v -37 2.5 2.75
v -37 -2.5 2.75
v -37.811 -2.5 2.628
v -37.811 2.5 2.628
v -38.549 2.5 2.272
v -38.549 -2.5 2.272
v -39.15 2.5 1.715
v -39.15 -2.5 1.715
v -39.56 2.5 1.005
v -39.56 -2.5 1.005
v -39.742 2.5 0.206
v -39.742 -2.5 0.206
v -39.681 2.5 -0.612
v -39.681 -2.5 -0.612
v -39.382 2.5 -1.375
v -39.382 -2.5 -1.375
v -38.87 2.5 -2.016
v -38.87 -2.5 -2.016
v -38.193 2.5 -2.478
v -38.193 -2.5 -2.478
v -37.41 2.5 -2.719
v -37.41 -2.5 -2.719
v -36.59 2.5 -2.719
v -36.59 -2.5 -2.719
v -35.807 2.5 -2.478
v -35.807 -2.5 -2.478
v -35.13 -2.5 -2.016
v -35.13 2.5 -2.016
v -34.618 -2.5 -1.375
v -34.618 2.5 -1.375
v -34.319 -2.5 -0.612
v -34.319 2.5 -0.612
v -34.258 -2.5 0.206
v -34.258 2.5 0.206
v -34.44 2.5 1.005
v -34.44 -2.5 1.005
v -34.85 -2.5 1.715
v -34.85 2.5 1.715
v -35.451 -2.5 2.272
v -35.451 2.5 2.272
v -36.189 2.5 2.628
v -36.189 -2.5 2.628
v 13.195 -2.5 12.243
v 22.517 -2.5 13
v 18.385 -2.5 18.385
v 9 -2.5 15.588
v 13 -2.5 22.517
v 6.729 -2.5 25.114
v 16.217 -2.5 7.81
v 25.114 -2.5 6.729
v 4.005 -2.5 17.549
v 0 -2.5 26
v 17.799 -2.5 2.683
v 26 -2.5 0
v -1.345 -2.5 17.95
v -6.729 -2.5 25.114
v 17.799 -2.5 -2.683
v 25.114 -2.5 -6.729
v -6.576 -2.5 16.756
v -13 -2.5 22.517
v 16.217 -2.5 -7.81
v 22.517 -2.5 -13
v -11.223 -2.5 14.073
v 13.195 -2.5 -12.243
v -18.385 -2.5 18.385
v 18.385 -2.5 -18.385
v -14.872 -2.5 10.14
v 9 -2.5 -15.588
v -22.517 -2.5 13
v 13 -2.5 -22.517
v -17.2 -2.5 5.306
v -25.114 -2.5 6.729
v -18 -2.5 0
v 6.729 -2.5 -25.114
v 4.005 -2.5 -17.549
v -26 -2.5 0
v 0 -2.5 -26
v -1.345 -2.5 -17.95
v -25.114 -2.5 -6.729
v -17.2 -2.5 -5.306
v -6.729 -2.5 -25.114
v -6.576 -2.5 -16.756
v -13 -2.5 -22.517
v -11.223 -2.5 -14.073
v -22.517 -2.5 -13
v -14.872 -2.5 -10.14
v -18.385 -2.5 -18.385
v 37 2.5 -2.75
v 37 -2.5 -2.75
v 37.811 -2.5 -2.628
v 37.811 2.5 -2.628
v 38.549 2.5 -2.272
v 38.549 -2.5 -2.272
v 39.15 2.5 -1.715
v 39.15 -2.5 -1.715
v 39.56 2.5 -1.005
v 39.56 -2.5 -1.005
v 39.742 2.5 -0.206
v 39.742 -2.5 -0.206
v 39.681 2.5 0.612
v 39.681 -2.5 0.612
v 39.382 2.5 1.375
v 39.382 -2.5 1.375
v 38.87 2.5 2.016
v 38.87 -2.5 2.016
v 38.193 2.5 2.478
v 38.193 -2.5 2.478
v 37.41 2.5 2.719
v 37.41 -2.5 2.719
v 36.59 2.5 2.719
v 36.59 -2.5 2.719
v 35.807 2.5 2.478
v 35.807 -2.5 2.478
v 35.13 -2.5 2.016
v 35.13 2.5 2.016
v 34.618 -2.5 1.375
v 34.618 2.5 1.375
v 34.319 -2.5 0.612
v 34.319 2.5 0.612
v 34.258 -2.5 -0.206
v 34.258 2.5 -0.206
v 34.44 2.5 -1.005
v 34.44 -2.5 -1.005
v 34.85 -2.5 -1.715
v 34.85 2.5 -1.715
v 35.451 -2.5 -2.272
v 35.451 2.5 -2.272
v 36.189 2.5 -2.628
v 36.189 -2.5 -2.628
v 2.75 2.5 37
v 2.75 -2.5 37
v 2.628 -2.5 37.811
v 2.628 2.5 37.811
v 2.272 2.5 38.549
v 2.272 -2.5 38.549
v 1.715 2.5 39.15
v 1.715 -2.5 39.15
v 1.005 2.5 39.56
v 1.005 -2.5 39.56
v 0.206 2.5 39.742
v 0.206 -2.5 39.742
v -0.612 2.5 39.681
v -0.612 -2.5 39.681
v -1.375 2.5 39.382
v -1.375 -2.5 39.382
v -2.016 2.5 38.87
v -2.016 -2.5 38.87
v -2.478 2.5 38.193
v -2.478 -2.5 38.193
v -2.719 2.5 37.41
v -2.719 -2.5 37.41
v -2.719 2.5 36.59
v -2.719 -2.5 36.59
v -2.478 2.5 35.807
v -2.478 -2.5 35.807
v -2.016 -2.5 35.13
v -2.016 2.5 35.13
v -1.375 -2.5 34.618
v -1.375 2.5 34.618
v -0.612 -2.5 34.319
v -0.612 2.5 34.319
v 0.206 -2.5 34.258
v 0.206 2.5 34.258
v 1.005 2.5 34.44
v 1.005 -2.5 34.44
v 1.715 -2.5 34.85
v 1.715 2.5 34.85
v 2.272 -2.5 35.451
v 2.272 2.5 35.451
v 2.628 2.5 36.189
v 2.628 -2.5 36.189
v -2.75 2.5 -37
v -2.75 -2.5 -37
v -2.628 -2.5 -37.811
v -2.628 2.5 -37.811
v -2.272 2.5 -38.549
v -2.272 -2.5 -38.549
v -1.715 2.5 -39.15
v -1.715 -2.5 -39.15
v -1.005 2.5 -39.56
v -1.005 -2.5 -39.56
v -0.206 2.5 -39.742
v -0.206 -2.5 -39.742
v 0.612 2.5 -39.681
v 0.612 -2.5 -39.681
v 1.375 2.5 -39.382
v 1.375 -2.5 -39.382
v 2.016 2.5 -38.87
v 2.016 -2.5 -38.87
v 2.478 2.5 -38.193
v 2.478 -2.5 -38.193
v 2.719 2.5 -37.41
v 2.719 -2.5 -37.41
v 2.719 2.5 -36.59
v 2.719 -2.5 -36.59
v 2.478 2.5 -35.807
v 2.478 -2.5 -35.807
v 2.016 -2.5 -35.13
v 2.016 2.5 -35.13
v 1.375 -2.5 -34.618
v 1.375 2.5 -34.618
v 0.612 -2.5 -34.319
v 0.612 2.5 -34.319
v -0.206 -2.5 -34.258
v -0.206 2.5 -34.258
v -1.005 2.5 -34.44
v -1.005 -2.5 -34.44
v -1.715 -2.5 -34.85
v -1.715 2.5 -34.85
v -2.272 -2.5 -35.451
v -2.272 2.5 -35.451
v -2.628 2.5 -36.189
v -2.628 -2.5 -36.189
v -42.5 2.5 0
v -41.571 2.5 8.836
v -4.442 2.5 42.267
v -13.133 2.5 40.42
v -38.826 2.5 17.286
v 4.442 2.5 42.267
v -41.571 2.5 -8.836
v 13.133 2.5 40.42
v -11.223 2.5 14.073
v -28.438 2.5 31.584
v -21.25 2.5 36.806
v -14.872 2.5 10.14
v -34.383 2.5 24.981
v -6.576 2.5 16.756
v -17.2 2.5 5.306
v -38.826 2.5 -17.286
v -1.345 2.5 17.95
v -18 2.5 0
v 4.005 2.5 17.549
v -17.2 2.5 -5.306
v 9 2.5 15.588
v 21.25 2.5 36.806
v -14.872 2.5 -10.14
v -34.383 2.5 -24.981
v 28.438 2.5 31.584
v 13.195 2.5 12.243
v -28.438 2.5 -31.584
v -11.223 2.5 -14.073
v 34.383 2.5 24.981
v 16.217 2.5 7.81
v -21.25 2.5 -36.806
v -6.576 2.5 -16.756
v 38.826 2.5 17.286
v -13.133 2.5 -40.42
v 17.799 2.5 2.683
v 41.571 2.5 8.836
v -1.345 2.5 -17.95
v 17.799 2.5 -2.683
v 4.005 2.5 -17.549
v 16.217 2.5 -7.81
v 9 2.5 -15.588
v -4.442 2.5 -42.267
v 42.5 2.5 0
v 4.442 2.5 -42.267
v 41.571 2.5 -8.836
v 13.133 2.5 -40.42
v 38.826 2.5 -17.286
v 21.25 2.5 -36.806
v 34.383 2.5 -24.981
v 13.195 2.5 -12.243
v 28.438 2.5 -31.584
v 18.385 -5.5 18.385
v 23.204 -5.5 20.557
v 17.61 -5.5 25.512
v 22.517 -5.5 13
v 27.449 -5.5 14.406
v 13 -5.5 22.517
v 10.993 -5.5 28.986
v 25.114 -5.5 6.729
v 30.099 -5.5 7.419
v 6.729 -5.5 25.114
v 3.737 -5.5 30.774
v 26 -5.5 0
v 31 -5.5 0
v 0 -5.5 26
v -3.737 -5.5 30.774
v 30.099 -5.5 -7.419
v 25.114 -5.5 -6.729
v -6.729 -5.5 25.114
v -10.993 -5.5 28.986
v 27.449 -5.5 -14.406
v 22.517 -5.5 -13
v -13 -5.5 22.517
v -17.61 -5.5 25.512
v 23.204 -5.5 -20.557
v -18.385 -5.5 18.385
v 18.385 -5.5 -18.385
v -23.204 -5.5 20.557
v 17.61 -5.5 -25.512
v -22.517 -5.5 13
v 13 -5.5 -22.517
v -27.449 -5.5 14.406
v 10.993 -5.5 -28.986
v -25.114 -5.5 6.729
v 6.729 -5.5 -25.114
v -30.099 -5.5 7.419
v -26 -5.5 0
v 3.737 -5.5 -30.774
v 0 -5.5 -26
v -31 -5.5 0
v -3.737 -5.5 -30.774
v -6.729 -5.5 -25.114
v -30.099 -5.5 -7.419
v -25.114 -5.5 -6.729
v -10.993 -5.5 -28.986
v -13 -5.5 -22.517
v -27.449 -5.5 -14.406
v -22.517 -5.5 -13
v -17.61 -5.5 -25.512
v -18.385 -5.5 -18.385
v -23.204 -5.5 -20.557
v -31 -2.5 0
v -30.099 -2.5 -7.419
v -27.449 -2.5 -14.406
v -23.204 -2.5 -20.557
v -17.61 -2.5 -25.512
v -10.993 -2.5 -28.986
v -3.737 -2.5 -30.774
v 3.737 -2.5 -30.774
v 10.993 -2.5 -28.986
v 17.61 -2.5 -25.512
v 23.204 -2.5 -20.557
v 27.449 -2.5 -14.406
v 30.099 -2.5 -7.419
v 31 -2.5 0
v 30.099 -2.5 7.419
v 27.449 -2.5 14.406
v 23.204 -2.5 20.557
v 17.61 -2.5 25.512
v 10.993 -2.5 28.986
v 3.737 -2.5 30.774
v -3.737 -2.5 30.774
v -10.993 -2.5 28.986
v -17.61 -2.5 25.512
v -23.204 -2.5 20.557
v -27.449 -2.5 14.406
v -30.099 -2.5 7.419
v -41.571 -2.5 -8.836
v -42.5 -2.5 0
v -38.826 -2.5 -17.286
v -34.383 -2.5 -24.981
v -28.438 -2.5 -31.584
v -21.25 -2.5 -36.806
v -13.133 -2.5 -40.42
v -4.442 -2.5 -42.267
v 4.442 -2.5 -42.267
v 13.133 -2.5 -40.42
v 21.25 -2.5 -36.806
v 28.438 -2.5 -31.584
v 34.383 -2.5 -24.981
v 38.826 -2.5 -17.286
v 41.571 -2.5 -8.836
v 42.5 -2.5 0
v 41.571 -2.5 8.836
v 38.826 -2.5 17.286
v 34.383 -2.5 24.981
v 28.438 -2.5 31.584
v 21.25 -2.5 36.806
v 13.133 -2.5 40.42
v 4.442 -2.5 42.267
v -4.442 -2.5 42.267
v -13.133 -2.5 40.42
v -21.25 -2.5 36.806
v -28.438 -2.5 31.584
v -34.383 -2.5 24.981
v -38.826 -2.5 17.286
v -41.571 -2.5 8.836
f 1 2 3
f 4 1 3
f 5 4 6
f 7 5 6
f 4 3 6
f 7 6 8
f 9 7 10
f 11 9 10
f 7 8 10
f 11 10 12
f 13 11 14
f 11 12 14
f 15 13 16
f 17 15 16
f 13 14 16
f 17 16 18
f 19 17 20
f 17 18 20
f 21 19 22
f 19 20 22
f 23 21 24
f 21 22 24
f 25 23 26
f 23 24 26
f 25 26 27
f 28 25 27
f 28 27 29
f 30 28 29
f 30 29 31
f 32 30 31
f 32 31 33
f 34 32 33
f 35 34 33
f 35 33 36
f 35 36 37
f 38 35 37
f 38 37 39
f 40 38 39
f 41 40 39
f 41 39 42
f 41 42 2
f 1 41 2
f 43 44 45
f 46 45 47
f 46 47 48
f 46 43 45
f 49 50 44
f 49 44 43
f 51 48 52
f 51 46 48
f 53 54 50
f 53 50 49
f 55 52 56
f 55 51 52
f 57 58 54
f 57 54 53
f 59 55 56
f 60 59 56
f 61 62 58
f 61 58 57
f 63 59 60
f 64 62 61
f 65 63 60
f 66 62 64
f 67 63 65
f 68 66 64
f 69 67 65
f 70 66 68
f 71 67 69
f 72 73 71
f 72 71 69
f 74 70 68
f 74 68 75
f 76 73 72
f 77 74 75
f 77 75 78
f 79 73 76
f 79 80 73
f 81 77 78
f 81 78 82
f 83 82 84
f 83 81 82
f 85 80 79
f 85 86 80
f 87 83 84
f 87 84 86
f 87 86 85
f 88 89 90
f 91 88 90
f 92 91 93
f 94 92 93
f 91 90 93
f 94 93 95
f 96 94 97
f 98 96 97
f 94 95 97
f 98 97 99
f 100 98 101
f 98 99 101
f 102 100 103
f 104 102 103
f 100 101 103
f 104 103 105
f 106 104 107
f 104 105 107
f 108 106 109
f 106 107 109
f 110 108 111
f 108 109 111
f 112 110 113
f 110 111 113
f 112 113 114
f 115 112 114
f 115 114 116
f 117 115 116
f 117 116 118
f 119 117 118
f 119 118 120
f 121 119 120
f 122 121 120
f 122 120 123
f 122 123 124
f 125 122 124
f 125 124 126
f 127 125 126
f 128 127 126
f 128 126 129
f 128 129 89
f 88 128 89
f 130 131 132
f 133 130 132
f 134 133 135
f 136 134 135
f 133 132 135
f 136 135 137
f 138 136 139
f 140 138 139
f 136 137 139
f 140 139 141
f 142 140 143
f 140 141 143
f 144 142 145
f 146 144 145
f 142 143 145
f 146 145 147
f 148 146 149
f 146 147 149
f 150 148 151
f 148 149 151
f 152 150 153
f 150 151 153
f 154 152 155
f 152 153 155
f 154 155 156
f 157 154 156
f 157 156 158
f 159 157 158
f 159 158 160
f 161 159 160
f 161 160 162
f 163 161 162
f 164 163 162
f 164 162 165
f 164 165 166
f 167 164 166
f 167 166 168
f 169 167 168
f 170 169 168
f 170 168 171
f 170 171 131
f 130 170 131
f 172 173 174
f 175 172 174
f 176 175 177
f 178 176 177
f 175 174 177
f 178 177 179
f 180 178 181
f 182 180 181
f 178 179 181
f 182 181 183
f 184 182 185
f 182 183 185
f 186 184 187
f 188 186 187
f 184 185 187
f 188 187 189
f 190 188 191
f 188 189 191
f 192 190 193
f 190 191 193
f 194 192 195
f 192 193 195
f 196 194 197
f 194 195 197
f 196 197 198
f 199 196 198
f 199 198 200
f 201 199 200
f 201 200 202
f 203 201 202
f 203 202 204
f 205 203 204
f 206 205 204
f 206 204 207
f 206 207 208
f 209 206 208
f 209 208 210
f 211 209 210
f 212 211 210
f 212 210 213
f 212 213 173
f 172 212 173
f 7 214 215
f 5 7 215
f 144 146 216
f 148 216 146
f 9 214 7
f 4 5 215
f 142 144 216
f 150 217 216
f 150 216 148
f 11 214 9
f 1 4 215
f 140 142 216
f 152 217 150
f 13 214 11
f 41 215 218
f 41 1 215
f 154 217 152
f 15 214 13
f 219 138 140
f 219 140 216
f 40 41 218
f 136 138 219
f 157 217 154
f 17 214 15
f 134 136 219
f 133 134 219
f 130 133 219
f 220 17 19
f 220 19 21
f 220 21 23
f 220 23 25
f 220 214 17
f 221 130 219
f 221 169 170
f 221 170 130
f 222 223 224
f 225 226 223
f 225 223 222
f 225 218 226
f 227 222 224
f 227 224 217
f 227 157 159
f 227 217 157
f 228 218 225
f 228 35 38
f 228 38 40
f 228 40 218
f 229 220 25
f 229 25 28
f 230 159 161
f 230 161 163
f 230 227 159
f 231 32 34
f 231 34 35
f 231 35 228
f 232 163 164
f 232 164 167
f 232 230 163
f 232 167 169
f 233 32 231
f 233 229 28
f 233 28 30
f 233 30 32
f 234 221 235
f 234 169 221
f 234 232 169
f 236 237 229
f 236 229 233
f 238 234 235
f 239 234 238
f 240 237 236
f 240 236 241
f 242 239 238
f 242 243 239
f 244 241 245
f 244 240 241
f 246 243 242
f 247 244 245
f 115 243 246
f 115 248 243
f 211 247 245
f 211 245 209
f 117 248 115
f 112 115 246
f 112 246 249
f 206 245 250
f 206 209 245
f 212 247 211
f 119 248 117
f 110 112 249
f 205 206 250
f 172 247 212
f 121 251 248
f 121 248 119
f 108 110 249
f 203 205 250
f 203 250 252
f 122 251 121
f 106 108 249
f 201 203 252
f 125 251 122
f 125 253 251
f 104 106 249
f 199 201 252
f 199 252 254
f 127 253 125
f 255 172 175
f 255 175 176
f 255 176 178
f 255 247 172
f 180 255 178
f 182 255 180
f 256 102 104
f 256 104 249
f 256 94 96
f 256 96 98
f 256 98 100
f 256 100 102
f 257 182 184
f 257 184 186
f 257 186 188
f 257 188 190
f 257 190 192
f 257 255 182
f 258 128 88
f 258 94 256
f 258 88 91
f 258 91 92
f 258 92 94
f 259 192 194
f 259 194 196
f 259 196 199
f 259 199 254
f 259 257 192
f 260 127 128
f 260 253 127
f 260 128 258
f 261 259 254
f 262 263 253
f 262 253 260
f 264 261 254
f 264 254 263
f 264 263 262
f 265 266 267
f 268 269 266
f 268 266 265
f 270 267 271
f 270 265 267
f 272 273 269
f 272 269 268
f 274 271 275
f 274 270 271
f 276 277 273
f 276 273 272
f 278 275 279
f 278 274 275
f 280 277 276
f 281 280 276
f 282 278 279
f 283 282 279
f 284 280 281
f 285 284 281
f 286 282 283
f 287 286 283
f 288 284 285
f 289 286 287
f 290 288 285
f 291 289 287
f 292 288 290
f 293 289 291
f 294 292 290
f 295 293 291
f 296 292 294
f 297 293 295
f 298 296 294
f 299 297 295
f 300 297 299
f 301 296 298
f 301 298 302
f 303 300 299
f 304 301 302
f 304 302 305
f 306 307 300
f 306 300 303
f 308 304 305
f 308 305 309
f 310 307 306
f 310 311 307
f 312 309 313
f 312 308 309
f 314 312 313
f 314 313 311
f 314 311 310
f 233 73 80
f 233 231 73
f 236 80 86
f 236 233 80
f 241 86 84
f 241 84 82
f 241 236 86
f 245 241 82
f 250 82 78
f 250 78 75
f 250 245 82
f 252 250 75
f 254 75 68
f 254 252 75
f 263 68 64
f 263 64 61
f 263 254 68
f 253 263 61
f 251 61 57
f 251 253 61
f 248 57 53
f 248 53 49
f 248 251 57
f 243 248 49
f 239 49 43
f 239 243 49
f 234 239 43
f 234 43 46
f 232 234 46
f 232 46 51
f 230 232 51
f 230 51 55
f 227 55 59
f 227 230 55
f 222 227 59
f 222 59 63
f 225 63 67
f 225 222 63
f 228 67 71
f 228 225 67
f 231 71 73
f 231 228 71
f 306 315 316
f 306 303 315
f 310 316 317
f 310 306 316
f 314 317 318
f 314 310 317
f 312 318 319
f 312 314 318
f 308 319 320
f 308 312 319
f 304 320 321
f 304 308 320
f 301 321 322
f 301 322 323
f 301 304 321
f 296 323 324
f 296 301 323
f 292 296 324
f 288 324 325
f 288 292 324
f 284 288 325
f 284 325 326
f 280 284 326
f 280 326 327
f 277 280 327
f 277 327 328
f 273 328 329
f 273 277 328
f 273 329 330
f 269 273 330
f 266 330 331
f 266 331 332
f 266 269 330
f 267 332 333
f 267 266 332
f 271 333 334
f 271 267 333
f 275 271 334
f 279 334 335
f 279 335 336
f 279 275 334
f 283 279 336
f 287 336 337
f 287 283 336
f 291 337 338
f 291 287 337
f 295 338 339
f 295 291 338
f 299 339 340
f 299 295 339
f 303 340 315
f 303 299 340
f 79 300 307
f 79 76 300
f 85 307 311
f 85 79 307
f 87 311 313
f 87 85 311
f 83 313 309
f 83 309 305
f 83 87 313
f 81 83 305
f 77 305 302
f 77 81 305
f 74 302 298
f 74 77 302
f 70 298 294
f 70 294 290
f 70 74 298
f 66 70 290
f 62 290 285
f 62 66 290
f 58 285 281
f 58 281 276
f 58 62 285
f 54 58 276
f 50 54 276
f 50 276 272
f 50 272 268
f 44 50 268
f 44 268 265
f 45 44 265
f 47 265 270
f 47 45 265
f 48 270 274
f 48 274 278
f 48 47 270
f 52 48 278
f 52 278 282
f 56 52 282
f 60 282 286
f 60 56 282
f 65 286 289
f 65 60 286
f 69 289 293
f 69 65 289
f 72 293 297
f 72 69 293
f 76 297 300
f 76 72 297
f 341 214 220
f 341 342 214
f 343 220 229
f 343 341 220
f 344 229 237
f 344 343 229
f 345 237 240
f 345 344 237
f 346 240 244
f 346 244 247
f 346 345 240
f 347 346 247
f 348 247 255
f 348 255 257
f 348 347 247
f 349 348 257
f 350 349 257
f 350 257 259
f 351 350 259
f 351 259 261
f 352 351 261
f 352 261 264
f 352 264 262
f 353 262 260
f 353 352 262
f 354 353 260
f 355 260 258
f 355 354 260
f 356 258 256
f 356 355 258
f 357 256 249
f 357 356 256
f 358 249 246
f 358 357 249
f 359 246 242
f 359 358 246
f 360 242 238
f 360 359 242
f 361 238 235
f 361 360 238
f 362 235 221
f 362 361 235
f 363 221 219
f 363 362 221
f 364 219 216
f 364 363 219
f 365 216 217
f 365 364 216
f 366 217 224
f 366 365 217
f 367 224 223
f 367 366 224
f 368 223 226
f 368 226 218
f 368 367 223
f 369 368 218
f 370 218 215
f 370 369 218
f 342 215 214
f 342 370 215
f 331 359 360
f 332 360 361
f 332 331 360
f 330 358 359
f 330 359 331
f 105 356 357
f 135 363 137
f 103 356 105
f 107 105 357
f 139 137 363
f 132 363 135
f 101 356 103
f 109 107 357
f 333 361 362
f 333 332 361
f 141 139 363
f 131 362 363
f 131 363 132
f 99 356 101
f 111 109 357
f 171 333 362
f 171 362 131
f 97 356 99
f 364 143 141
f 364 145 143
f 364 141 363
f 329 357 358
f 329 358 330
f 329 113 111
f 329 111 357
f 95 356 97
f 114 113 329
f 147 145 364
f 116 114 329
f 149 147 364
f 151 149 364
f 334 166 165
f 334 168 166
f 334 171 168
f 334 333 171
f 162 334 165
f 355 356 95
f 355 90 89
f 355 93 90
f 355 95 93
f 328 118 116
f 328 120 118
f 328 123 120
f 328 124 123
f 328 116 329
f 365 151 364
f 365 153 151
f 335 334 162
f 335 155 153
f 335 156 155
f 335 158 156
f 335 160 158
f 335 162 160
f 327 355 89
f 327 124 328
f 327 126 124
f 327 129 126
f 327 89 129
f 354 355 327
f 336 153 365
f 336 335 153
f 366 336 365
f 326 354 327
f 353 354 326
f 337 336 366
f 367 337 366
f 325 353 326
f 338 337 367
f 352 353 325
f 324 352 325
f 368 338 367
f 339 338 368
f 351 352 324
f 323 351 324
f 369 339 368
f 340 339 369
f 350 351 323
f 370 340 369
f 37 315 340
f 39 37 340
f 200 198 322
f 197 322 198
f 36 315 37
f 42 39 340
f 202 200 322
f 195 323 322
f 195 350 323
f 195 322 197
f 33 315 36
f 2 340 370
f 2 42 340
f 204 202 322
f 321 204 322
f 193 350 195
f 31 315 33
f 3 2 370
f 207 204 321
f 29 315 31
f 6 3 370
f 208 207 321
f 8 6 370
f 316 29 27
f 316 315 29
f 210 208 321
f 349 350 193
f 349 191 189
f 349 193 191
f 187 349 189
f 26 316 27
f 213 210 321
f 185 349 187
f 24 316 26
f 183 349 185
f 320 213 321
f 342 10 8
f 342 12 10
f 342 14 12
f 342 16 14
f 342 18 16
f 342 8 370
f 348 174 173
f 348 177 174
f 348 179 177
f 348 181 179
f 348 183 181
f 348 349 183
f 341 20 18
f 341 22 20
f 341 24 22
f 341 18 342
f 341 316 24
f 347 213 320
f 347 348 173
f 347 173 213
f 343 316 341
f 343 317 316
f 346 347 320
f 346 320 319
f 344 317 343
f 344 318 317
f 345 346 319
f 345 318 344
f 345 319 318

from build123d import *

# Parameters (mm, degrees)
M5_CLEARANCE_HOLE1_D = 5.5
CIRPATTERN1_COUNT    = 4


with BuildPart() as part:
    # Sketch1 → Revolve1 (revolve)
    with BuildSketch(Plane.XY):
        Polygon((-18, 2.5), (-42.5, 2.5), (-42.5, -2.5), (-31, -2.5), (-31, -5.5), (-26, -5.5), (-26, -2.5), (-18, -2.5), align=None)
    revolve(axis=Axis((0, 0, 0), (0, -1, 0)))

    # M5 Clearance Hole1 (through all)
    with Locations(Plane(origin=(37, 2.5, 0), x_dir=(0, 0, 1), z_dir=(0, 1, 0))):
        with Locations((0, 0)):
            m5_clearance_hole1 = Hole(M5_CLEARANCE_HOLE1_D / 2)

    # CirPattern1: M5 Clearance Hole1 ×4 about axis
    cirpattern1_axis = Axis((0, 55, 0), (0, -1, 0))
    for i in range(1, CIRPATTERN1_COUNT):
        add(m5_clearance_hole1.rotate(cirpattern1_axis, i * 360 / CIRPATTERN1_COUNT), mode=Mode.SUBTRACT)


solid = part.part
